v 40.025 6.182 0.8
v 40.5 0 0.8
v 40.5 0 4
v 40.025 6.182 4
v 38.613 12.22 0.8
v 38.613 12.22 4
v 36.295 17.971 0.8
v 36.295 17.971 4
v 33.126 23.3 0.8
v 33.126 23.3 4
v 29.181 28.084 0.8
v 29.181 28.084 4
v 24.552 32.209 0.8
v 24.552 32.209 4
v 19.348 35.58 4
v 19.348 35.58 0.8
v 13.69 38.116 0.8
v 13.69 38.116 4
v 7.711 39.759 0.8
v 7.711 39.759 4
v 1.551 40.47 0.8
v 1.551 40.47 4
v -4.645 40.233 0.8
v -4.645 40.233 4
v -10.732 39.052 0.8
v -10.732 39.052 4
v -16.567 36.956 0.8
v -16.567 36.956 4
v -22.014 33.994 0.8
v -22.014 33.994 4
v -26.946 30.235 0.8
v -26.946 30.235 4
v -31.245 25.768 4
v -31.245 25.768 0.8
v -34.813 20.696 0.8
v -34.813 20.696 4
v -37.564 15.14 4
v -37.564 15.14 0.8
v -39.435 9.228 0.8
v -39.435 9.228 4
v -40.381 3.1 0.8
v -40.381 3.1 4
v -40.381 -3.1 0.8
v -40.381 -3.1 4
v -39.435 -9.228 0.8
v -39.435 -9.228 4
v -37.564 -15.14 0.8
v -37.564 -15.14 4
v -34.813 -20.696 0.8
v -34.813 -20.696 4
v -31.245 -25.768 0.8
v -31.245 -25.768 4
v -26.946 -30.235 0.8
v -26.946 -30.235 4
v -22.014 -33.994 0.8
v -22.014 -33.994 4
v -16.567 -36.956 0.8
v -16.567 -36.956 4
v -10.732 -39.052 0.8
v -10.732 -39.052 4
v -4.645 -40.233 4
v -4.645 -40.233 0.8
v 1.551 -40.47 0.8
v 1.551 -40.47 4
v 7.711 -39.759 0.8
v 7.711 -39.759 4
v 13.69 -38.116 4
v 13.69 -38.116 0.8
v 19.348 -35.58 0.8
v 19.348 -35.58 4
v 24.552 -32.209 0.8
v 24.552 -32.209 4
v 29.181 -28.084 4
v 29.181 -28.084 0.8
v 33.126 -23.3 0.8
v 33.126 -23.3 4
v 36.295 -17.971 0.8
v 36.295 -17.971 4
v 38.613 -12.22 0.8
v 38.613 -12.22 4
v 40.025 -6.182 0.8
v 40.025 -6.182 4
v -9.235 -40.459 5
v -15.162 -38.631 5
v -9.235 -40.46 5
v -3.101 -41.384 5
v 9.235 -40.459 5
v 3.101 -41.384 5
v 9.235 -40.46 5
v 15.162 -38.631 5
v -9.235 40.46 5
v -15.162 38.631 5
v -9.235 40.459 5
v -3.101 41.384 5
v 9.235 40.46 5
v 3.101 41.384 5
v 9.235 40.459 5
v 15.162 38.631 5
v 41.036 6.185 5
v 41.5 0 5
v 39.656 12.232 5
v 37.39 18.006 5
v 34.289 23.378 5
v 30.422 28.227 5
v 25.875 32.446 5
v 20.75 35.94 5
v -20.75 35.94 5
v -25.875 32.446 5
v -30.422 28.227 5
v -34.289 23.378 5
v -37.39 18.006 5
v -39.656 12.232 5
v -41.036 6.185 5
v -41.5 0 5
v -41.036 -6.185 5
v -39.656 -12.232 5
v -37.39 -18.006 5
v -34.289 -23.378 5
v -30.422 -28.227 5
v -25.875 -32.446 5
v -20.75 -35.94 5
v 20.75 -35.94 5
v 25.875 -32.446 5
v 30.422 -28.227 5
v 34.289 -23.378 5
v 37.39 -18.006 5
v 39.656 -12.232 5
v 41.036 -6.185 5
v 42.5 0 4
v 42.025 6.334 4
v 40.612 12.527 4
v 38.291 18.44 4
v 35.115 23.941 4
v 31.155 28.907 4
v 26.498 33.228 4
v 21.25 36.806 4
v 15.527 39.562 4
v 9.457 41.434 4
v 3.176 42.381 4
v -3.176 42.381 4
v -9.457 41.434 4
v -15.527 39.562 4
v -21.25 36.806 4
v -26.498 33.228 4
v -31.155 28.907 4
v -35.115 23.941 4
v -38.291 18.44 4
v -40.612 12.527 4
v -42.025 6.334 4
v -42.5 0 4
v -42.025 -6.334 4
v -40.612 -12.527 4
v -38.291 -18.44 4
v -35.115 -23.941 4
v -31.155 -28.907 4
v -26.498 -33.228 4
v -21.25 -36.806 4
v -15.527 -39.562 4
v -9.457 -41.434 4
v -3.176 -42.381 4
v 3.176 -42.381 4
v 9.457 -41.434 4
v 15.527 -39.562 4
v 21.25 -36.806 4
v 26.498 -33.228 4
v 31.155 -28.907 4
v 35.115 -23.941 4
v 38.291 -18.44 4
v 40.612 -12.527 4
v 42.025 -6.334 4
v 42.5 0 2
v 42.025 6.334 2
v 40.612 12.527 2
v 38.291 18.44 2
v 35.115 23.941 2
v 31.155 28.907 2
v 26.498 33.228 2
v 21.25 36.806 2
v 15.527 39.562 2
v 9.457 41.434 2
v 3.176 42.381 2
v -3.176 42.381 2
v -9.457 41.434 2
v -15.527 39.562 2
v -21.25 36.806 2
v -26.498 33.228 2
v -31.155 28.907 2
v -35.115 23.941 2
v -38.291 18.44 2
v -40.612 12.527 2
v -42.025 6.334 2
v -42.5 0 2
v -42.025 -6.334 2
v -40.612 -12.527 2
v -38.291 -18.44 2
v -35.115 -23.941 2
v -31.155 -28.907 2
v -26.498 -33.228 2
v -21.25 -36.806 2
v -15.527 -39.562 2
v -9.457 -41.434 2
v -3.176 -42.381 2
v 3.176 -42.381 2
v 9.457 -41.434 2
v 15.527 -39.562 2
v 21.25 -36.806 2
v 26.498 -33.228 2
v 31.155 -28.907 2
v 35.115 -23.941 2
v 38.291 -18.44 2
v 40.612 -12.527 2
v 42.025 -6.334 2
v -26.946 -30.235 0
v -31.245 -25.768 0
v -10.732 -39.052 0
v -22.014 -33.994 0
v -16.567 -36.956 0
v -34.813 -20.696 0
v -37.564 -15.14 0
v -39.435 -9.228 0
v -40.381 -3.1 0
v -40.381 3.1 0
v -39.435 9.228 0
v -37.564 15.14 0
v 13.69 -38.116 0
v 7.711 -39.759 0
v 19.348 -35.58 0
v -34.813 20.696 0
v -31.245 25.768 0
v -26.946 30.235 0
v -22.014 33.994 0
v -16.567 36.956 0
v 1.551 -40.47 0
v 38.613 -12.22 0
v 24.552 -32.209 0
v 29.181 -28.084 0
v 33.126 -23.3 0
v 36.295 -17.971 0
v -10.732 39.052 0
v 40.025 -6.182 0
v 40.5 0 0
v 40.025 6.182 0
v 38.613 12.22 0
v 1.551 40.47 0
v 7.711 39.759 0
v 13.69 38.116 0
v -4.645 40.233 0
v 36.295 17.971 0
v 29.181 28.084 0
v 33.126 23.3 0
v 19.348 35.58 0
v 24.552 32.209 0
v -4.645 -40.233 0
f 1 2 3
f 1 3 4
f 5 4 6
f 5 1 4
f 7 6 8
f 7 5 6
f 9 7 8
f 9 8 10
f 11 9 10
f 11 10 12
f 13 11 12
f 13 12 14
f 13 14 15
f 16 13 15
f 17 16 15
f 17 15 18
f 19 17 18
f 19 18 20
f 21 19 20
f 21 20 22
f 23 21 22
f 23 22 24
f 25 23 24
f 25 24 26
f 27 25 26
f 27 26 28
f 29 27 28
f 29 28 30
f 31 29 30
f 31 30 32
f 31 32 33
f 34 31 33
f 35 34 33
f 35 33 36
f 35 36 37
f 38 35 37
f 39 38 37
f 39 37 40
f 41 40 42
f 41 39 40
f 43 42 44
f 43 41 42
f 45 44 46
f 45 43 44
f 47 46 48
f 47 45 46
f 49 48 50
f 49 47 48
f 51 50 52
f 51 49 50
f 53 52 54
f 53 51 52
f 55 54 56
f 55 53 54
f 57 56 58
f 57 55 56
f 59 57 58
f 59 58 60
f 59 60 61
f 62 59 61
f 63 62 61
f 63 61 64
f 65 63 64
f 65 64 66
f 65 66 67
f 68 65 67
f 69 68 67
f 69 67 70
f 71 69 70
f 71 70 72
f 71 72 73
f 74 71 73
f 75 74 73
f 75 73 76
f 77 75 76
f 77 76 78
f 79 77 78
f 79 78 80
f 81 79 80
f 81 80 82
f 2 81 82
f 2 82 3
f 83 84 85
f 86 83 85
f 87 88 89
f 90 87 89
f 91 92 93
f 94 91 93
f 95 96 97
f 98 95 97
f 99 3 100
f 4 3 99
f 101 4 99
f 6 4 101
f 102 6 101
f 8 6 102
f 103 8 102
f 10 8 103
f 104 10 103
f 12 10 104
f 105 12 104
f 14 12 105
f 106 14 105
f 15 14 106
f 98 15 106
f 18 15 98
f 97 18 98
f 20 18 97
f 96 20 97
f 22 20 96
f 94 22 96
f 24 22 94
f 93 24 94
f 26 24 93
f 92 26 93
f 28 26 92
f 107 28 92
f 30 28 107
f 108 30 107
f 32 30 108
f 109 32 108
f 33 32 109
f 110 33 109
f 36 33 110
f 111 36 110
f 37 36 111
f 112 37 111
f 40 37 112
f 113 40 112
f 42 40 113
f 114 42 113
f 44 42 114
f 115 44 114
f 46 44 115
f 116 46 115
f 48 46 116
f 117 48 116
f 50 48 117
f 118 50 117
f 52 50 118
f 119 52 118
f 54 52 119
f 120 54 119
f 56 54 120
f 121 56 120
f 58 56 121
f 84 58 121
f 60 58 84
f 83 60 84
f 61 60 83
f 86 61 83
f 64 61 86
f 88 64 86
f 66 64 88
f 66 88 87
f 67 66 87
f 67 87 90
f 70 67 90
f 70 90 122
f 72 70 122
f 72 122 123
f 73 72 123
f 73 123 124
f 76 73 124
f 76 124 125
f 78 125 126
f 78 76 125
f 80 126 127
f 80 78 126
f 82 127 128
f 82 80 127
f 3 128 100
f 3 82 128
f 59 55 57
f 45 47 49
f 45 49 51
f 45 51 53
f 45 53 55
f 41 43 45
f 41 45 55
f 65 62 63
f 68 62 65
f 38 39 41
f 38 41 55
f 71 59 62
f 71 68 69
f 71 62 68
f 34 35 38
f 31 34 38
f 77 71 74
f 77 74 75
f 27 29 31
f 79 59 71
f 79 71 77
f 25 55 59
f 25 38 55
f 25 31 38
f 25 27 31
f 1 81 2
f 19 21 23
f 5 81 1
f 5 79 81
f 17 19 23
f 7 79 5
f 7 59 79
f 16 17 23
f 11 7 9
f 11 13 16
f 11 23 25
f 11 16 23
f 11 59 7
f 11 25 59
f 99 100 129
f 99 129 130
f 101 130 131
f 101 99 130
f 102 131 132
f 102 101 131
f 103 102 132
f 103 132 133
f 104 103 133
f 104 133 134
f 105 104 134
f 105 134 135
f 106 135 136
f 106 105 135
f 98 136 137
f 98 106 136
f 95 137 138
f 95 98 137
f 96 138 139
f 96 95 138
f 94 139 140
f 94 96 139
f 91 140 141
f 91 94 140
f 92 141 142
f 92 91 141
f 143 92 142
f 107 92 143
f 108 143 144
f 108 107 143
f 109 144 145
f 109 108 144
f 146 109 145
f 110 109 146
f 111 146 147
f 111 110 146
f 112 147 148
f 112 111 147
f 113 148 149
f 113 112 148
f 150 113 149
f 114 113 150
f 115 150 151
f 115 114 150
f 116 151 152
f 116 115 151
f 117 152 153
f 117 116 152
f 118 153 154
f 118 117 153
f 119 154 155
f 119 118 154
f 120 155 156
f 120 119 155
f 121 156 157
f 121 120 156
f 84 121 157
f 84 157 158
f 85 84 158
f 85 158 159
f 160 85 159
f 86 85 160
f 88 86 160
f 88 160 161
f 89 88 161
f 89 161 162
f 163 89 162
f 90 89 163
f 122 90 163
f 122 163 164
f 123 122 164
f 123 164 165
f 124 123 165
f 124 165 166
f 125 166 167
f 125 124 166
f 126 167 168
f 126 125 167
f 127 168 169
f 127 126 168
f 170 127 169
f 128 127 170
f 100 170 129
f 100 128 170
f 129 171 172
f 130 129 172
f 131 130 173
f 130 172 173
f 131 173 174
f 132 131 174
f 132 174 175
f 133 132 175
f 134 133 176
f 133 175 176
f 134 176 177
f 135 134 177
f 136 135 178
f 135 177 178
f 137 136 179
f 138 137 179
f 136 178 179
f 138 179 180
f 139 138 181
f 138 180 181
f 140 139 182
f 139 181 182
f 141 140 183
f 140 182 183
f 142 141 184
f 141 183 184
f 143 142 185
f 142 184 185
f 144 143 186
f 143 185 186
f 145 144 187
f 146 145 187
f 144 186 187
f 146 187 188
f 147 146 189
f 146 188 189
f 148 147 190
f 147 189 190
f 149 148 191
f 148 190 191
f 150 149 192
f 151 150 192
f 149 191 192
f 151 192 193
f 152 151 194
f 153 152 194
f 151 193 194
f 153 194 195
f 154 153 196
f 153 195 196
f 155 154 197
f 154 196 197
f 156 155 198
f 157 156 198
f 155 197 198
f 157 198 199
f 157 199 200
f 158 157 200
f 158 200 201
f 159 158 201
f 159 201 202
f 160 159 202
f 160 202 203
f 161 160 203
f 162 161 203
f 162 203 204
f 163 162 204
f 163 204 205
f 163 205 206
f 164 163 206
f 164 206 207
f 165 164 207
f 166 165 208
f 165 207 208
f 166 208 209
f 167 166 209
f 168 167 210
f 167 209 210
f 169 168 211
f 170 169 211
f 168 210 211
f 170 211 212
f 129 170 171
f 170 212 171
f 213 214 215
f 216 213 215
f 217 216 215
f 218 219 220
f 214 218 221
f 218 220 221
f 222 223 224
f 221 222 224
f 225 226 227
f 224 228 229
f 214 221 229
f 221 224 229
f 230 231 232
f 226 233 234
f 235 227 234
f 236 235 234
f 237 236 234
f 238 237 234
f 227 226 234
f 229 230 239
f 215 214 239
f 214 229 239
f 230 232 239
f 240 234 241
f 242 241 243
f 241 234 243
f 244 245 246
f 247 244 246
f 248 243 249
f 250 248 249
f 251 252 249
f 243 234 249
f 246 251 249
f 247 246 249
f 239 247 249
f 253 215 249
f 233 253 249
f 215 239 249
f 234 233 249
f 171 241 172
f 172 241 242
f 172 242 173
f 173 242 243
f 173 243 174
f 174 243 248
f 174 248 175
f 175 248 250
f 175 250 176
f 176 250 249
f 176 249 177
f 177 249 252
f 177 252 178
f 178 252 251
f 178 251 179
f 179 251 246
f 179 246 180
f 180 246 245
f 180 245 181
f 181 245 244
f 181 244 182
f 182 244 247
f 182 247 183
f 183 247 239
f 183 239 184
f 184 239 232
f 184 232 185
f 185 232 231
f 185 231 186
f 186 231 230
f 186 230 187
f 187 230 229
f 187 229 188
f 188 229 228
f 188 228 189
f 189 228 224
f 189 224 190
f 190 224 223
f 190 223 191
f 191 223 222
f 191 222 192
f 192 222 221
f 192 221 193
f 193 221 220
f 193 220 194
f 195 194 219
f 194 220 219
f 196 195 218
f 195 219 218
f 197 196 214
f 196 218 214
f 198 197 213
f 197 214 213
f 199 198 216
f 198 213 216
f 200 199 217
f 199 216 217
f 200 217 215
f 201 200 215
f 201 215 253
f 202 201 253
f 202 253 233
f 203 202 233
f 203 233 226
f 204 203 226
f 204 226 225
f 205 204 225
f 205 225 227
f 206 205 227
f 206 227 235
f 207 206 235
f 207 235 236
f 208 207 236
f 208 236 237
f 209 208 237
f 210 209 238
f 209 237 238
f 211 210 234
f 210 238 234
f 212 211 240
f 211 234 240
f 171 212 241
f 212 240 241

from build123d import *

# Parameters (mm, degrees)
F0_R     = 40.5
F1_DEPTH = 0.8
F0_R_2   = 42.5
F2_DEPTH = 5
F3_SIZE  = 2
F4_SIZE  = 0.99999


# Not quite as in the source:
# - a fillet or chamfer is up to 0.001 mm smaller than in the source, because OpenCascade refuses the exact size


with BuildPart() as f1:
    # F0 (on Top) → F1 (new body)
    with BuildSketch(Plane.XY):
        Circle(F0_R)
    extrude(amount=F1_DEPTH)

    # F0 (on Top) → F2 (join)
    with BuildSketch(Plane.XY):
        Circle(F0_R_2)
        Circle(F0_R, mode=Mode.SUBTRACT)
    extrude(amount=F2_DEPTH)

    # F3
    f3_edges = [f1.edges().sort_by_distance(p)[0] for p in [
        (-42.5, 0, 0),
    ]]
    chamfer(f3_edges, length=F3_SIZE)

    # F4 (size 1 in the source; OpenCascade refuses exactly that, so slightly less here)
    f4_edges = [f1.edges().sort_by_distance(p)[0] for p in [
        (-40.5, 0, 5),
        (-42.5, 0, 5),
    ]]
    chamfer(f4_edges, length=F4_SIZE)


solid = f1.part
